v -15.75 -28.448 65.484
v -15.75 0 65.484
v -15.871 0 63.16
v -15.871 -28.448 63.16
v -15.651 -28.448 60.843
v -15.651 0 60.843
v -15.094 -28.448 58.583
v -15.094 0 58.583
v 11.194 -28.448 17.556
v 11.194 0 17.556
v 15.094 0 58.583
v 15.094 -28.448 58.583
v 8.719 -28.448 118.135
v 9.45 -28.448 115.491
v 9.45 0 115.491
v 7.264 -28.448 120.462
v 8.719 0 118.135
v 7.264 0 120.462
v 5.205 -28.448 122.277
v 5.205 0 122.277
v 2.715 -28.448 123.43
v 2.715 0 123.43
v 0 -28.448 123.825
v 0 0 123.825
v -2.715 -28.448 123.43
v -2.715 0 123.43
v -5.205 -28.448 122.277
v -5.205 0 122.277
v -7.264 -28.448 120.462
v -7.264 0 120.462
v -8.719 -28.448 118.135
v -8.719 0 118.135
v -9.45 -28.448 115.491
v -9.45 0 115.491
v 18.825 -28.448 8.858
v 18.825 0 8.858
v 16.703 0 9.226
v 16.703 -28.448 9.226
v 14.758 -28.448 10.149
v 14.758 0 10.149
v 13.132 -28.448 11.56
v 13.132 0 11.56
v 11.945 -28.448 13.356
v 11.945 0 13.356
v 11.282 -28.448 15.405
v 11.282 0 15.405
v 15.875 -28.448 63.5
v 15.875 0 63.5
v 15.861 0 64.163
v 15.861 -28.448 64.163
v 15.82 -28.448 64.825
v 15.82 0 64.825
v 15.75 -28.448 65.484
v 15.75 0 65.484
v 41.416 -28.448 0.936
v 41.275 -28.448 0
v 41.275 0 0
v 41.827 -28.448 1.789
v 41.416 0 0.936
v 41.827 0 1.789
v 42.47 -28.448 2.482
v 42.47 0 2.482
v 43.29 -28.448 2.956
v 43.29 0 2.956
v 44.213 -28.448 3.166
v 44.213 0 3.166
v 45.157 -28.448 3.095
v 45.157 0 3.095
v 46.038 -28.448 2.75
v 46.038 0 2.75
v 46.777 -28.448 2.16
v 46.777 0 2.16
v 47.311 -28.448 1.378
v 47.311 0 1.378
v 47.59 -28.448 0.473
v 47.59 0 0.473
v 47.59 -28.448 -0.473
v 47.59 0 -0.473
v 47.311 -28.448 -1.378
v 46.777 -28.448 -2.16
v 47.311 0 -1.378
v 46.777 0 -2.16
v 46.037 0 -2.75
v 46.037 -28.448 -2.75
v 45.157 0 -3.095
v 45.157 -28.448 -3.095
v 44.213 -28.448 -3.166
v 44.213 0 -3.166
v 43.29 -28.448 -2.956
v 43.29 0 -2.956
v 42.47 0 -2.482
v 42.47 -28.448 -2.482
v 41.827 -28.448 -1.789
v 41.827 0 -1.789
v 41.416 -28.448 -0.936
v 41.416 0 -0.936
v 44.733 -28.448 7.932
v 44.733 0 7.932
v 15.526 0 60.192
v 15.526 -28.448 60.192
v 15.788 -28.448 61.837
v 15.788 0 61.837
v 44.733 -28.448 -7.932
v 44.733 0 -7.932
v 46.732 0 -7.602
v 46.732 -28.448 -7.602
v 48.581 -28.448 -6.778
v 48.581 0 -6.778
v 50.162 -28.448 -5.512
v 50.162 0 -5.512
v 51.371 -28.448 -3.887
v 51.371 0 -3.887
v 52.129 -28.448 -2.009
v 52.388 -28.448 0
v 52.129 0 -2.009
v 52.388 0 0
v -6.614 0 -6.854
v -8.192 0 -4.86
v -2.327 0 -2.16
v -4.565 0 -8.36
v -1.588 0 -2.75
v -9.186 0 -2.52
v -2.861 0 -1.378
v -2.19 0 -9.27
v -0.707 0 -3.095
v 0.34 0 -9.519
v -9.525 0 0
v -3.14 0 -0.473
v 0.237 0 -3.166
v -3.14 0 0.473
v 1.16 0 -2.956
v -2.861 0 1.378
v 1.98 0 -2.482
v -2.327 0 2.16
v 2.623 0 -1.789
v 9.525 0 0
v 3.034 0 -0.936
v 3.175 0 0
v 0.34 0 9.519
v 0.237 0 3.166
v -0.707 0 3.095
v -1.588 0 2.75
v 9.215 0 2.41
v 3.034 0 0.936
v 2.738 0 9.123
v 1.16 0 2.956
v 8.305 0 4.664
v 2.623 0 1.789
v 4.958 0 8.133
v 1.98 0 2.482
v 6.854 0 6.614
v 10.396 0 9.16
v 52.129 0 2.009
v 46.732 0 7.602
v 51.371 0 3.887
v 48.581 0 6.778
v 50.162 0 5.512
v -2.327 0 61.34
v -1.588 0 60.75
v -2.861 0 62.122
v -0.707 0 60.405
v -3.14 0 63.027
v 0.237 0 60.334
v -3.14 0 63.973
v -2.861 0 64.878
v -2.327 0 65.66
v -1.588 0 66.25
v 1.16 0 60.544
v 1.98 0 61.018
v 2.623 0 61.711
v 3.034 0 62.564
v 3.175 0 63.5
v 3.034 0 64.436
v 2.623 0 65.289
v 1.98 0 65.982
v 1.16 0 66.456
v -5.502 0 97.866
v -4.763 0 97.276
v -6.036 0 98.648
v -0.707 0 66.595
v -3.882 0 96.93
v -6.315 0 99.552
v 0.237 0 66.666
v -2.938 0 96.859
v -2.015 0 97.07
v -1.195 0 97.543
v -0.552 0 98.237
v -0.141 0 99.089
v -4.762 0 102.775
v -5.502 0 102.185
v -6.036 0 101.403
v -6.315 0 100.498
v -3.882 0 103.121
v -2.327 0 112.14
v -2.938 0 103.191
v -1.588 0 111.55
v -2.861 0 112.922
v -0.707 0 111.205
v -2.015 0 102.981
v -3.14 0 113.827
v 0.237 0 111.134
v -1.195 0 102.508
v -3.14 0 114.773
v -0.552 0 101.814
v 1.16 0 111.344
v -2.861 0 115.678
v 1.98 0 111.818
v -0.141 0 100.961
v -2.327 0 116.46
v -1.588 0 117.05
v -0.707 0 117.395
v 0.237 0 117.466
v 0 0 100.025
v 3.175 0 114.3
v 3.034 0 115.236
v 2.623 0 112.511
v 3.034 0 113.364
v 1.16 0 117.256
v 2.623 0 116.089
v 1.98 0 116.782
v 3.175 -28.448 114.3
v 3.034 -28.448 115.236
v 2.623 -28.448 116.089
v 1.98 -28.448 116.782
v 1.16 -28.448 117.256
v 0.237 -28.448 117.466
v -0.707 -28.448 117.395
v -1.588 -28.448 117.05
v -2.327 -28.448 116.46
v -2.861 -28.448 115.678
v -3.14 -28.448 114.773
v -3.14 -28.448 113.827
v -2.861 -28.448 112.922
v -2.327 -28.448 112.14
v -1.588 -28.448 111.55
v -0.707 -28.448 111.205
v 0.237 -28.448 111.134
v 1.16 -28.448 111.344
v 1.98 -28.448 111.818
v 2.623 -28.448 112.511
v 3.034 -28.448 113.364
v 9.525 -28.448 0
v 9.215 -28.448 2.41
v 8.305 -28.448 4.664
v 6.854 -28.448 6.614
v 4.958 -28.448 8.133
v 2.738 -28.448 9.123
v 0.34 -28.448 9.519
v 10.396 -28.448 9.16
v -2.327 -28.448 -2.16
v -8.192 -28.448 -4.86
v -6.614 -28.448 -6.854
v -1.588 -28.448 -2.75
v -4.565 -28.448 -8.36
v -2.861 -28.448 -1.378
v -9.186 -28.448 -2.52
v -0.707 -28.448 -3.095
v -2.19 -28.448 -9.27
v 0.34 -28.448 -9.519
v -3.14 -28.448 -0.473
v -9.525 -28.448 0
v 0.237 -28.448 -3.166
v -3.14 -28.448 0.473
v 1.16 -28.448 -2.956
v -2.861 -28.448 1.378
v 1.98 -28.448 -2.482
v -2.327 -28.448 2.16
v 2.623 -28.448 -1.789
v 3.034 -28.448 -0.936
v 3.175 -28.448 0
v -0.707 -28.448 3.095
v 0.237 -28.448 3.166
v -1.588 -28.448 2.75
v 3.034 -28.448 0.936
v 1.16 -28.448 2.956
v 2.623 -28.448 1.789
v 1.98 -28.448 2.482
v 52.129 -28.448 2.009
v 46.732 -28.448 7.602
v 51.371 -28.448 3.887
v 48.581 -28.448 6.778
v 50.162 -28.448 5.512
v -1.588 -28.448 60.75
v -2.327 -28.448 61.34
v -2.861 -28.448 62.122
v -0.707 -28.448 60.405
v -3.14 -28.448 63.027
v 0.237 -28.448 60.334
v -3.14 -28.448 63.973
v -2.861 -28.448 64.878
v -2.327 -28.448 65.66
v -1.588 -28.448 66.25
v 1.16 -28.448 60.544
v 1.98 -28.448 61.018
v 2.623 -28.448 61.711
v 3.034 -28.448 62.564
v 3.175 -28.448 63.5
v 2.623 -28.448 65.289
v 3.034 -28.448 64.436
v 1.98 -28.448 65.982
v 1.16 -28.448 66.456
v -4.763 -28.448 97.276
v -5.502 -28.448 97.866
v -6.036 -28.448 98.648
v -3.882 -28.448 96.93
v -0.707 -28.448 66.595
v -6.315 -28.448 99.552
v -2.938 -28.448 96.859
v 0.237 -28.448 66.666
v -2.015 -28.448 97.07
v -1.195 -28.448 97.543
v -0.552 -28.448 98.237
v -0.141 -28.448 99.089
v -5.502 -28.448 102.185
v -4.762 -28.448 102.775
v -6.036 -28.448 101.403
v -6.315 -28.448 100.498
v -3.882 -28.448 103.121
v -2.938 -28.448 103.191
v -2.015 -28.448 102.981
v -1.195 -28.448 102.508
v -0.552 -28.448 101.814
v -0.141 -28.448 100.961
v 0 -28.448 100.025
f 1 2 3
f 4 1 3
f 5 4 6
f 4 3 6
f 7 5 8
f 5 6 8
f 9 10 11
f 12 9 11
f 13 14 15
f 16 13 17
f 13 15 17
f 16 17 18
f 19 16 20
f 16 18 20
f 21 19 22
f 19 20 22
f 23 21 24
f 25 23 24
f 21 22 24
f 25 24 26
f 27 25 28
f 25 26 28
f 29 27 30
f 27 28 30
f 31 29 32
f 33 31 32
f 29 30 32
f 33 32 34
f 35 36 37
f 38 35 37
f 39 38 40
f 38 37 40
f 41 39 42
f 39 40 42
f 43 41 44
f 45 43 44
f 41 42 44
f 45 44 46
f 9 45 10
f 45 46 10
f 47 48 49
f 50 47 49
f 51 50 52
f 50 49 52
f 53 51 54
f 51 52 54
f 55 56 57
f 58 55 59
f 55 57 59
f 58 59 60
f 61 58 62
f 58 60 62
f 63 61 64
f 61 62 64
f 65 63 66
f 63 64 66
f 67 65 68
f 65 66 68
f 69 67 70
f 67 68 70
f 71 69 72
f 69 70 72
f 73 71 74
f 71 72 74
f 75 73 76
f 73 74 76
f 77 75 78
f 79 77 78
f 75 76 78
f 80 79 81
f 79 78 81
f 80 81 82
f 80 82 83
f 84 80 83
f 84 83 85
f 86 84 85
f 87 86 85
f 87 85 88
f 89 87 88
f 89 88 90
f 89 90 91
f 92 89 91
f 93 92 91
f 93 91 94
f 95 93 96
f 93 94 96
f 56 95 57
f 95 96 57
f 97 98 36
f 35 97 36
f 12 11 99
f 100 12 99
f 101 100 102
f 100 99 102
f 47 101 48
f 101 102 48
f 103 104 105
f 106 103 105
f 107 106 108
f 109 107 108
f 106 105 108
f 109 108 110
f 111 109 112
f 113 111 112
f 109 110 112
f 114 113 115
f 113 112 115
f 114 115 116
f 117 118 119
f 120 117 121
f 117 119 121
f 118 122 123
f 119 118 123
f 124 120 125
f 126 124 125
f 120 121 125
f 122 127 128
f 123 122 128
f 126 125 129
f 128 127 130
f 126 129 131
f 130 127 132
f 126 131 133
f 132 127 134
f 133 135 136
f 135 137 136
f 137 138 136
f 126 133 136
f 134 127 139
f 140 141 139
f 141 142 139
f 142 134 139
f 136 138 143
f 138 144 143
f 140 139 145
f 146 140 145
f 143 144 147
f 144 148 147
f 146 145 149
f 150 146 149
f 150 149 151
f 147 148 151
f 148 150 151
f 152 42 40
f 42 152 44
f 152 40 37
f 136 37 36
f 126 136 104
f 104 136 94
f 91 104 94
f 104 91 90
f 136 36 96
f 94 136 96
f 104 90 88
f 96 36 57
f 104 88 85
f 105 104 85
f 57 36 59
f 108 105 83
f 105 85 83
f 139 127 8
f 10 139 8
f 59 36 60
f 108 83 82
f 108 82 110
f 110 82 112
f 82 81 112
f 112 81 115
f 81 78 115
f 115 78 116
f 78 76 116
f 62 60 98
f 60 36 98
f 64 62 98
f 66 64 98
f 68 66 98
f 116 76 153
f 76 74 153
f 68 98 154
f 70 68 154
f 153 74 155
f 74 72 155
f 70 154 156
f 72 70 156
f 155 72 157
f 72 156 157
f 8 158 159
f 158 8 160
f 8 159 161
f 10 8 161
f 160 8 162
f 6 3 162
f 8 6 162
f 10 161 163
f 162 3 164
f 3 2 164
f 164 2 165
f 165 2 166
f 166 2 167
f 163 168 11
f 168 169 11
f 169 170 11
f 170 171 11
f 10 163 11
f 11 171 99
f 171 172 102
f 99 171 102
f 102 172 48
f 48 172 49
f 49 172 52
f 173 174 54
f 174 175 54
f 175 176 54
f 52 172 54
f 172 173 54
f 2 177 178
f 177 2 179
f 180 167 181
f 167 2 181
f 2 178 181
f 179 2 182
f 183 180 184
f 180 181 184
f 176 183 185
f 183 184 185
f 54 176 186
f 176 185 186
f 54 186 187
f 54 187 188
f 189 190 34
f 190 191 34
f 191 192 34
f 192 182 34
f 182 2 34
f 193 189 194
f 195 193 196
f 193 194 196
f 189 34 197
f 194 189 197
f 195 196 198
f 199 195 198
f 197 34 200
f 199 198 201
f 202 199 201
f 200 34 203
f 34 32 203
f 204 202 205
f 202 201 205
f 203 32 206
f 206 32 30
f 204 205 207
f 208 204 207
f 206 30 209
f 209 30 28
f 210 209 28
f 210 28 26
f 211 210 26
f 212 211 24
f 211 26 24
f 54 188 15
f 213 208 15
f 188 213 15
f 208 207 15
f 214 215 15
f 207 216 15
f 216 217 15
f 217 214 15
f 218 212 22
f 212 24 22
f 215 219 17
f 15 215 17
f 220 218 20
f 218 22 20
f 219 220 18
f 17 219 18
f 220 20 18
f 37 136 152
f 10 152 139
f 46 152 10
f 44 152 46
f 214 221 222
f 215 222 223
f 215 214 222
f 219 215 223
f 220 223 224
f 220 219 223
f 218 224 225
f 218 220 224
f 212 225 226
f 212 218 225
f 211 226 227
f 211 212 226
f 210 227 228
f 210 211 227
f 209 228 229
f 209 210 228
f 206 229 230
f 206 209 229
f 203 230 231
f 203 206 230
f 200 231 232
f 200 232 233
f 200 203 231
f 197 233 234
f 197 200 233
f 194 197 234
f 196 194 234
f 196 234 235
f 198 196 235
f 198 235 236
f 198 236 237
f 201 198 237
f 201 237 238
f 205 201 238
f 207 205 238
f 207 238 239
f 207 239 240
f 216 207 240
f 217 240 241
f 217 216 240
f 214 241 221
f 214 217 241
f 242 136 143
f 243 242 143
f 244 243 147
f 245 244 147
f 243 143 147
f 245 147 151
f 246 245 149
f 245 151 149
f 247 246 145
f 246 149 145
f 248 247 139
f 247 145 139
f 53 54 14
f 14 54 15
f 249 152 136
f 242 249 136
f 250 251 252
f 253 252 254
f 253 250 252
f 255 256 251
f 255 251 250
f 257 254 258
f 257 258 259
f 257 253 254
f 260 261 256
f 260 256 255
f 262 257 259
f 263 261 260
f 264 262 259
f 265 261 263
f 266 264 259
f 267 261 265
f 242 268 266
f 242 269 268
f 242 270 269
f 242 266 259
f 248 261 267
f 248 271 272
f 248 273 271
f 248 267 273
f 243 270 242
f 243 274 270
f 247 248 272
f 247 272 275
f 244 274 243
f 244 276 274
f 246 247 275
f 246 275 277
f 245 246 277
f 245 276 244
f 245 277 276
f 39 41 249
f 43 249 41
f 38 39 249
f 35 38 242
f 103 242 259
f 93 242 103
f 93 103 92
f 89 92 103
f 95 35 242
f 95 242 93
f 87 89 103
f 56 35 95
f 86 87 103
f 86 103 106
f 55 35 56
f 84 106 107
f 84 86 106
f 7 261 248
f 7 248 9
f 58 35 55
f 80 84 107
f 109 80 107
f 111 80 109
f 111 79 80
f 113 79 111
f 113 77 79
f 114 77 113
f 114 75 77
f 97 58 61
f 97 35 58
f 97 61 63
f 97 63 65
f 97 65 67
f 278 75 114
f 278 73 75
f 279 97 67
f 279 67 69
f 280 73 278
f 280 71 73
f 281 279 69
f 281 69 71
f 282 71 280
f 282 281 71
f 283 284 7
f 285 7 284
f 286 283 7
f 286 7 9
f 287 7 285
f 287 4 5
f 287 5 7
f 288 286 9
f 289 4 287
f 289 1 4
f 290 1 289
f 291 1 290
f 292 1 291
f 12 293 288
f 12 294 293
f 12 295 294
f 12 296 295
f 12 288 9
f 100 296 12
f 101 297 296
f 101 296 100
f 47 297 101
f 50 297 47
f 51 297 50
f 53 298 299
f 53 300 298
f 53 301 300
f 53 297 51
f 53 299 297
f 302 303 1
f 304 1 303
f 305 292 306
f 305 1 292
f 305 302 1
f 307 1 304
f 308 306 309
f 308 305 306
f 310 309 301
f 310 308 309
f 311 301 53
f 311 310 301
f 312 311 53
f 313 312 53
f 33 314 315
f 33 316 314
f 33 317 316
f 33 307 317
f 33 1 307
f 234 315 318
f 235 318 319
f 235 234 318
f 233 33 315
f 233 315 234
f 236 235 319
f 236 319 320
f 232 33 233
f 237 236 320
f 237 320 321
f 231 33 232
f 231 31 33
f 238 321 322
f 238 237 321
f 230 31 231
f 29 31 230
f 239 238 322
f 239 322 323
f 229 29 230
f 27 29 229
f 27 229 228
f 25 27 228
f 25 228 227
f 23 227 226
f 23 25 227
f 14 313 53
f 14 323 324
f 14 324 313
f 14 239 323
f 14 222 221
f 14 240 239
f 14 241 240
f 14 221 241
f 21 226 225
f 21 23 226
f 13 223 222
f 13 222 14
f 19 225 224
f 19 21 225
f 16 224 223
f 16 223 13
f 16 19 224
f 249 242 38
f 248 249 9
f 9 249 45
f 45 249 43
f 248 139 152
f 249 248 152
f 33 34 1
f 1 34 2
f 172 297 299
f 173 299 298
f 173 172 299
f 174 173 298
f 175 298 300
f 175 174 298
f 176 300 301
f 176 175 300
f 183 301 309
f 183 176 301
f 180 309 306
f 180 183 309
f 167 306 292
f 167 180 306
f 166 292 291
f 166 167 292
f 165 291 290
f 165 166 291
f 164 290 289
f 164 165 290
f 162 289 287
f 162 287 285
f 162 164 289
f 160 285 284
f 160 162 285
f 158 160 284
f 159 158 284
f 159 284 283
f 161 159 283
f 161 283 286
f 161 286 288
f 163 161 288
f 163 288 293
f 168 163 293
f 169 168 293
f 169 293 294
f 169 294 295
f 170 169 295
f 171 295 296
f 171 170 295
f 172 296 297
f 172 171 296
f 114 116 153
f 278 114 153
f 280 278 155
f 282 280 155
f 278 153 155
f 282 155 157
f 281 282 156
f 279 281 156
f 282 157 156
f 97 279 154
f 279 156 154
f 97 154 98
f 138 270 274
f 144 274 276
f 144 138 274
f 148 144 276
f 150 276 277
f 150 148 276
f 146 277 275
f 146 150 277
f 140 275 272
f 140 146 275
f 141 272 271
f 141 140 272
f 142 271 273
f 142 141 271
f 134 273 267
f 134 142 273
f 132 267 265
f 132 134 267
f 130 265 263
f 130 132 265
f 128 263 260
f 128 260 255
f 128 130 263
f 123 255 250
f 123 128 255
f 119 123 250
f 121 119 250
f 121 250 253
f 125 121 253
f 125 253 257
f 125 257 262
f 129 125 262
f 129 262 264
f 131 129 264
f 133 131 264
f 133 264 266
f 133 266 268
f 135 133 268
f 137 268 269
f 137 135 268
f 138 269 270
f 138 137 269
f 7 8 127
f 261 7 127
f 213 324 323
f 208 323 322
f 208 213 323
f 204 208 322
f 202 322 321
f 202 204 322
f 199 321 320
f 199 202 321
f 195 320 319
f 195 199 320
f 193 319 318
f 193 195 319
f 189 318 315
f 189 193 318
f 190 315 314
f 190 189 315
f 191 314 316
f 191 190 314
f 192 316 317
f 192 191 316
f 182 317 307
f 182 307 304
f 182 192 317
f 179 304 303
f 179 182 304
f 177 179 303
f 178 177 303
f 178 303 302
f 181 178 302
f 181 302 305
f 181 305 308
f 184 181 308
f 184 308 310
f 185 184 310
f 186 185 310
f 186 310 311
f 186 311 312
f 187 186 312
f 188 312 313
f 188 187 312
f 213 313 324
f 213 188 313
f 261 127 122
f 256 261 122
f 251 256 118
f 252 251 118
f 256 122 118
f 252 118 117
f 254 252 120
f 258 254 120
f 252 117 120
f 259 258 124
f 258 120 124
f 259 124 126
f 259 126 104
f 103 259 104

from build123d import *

# Parameters (mm, degrees)
F0_R     = 3.175
F1_DEPTH = 28.448


with BuildPart() as f1:
    # F0 (on Front) → F1 (new body)
    with BuildSketch(Plane.XZ):
        with BuildLine():
            ThreePointArc((-9.4502929642, 115.490625), (-0.596483242, 104.7936951058), (9.525, 114.3))
            ThreePointArc((9.525, 114.3), (9.5063048942, 114.896483242), (9.4502929642, 115.490625))
            ThreePointArc((9.4502929642, 115.490625), (0, 123.825), (-9.4502929642, 115.490625))
        make_face()
        with Locations((0, 114.3)):
            Circle(F0_R, mode=Mode.SUBTRACT)
        with BuildLine():
            ThreePointArc((9.4502929642, 115.490625), (9.5063048942, 114.896483242), (9.525, 114.3))
            ThreePointArc((9.525, 114.3), (-0.596483242, 104.7936951058), (-9.4502929642, 115.490625))
            Line((-9.4502929642, 115.490625), (-15.7504882737, 65.484375))
            ThreePointArc((-15.7504882737, 65.484375), (0, 79.375), (15.7504882737, 65.484375))
            Line((15.7504882737, 65.484375), (9.4502929642, 115.490625))
        make_face()
        with Locations((-3.175, 100.0252)):
            Circle(F0_R, mode=Mode.SUBTRACT)
        with BuildLine():
            Line((15.0944103202, 58.583252896), (15.7504882737, 65.484375))
            ThreePointArc((15.7504882737, 65.484375), (0, 79.375), (-15.7504882737, 65.484375))
            Line((-15.7504882737, 65.484375), (-15.0944103202, 58.583252896))
            ThreePointArc((-15.0944103202, 58.583252896), (0, 47.625), (15.0944103202, 58.583252896))
        make_face()
        with Locations((0, 63.5)):
            Circle(F0_R, mode=Mode.SUBTRACT)
        with BuildLine():
            ThreePointArc((15.875, 63.5), (15.8438414904, 64.4941387366), (15.7504882737, 65.484375))
            Line((15.7504882737, 65.484375), (15.0944103202, 58.583252896))
            ThreePointArc((15.0944103202, 58.583252896), (15.6786381557, 61.0108373731), (15.875, 63.5))
        make_face()
        with BuildLine():
            Line((-15.0944103202, 58.583252896), (-15.7504882737, 65.484375))
            ThreePointArc((-15.7504882737, 65.484375), (-15.8037436669, 61.9975649401), (-15.0944103202, 58.583252896))
        make_face()
        with BuildLine():
            Line((11.1940088369, 17.5558921241), (15.0944103202, 58.583252896))
            ThreePointArc((15.0944103202, 58.583252896), (0, 47.625), (-15.0944103202, 58.583252896))
            Line((-15.0944103202, 58.583252896), (-9.525, 0))
            ThreePointArc((-9.525, 0), (-6.6138273378, 6.8544082857), (0.3401785714, 9.5189234444))
            Line((0.3401785714, 9.5189234444), (10.3957843217, 9.159565412))
            Line((10.3957843217, 9.159565412), (11.1940088369, 17.5558921241))
        make_face()
        with BuildLine():
            ThreePointArc((18.824587951, 8.8583445445), (13.1322805896, 11.560363002), (11.1940088369, 17.5558921241))
            Line((11.1940088369, 17.5558921241), (10.3957843217, 9.159565412))
            Line((10.3957843217, 9.159565412), (18.824587951, 8.8583445445))
        make_face()
        with BuildLine():
            ThreePointArc((0.3401785714, 9.5189234444), (-6.6138273378, 6.8544082857), (-9.525, 0))
            ThreePointArc((-9.525, 0), (-6.6138273378, -6.8544082857), (0.3401785714, -9.5189234444))
            ThreePointArc((0.3401785714, -9.5189234444), (6.8544082857, -6.6138273378), (9.525, 0))
            ThreePointArc((9.525, 0), (6.8544082857, 6.6138273378), (0.3401785714, 9.5189234444))
        make_face()
        Circle(F0_R, mode=Mode.SUBTRACT)
        with BuildLine():
            Line((18.824587951, 8.8583445445), (10.3957843217, 9.159565412))
            Line((10.3957843217, 9.159565412), (9.525, 0))
            Line((9.525, 0), (36.5125, 0))
            ThreePointArc((36.5125, 0), (38.9384772185, 5.7120069047), (44.7334821429, 7.9324362036))
            Line((44.7334821429, 7.9324362036), (18.824587951, 8.8583445445))
        make_face()
        with BuildLine():
            ThreePointArc((9.525, 0), (6.8544082857, -6.6138273378), (0.3401785714, -9.5189234444))
            Line((0.3401785714, -9.5189234444), (44.7334821429, -7.9324362036))
            ThreePointArc((44.7334821429, -7.9324362036), (38.9384772185, -5.7120069047), (36.5125, 0))
            Line((36.5125, 0), (9.525, 0))
        make_face()
        with BuildLine():
            ThreePointArc((52.3875, 0), (50.1620069047, 5.5115227815), (44.7334821429, 7.9324362036))
            ThreePointArc((44.7334821429, 7.9324362036), (38.9384772185, 5.7120069047), (36.5125, 0))
            ThreePointArc((36.5125, 0), (38.9384772185, -5.7120069047), (44.7334821429, -7.9324362036))
            ThreePointArc((44.7334821429, -7.9324362036), (50.1620069047, -5.5115227815), (52.3875, 0))
        make_face()
        with BuildLine():
            ThreePointArc((47.625, 0), (44.45, -3.175), (41.275, 0))
            ThreePointArc((41.275, 0), (44.45, 3.175), (47.625, 0))
        make_face(mode=Mode.SUBTRACT)
    extrude(amount=F1_DEPTH)


solid = f1.part
